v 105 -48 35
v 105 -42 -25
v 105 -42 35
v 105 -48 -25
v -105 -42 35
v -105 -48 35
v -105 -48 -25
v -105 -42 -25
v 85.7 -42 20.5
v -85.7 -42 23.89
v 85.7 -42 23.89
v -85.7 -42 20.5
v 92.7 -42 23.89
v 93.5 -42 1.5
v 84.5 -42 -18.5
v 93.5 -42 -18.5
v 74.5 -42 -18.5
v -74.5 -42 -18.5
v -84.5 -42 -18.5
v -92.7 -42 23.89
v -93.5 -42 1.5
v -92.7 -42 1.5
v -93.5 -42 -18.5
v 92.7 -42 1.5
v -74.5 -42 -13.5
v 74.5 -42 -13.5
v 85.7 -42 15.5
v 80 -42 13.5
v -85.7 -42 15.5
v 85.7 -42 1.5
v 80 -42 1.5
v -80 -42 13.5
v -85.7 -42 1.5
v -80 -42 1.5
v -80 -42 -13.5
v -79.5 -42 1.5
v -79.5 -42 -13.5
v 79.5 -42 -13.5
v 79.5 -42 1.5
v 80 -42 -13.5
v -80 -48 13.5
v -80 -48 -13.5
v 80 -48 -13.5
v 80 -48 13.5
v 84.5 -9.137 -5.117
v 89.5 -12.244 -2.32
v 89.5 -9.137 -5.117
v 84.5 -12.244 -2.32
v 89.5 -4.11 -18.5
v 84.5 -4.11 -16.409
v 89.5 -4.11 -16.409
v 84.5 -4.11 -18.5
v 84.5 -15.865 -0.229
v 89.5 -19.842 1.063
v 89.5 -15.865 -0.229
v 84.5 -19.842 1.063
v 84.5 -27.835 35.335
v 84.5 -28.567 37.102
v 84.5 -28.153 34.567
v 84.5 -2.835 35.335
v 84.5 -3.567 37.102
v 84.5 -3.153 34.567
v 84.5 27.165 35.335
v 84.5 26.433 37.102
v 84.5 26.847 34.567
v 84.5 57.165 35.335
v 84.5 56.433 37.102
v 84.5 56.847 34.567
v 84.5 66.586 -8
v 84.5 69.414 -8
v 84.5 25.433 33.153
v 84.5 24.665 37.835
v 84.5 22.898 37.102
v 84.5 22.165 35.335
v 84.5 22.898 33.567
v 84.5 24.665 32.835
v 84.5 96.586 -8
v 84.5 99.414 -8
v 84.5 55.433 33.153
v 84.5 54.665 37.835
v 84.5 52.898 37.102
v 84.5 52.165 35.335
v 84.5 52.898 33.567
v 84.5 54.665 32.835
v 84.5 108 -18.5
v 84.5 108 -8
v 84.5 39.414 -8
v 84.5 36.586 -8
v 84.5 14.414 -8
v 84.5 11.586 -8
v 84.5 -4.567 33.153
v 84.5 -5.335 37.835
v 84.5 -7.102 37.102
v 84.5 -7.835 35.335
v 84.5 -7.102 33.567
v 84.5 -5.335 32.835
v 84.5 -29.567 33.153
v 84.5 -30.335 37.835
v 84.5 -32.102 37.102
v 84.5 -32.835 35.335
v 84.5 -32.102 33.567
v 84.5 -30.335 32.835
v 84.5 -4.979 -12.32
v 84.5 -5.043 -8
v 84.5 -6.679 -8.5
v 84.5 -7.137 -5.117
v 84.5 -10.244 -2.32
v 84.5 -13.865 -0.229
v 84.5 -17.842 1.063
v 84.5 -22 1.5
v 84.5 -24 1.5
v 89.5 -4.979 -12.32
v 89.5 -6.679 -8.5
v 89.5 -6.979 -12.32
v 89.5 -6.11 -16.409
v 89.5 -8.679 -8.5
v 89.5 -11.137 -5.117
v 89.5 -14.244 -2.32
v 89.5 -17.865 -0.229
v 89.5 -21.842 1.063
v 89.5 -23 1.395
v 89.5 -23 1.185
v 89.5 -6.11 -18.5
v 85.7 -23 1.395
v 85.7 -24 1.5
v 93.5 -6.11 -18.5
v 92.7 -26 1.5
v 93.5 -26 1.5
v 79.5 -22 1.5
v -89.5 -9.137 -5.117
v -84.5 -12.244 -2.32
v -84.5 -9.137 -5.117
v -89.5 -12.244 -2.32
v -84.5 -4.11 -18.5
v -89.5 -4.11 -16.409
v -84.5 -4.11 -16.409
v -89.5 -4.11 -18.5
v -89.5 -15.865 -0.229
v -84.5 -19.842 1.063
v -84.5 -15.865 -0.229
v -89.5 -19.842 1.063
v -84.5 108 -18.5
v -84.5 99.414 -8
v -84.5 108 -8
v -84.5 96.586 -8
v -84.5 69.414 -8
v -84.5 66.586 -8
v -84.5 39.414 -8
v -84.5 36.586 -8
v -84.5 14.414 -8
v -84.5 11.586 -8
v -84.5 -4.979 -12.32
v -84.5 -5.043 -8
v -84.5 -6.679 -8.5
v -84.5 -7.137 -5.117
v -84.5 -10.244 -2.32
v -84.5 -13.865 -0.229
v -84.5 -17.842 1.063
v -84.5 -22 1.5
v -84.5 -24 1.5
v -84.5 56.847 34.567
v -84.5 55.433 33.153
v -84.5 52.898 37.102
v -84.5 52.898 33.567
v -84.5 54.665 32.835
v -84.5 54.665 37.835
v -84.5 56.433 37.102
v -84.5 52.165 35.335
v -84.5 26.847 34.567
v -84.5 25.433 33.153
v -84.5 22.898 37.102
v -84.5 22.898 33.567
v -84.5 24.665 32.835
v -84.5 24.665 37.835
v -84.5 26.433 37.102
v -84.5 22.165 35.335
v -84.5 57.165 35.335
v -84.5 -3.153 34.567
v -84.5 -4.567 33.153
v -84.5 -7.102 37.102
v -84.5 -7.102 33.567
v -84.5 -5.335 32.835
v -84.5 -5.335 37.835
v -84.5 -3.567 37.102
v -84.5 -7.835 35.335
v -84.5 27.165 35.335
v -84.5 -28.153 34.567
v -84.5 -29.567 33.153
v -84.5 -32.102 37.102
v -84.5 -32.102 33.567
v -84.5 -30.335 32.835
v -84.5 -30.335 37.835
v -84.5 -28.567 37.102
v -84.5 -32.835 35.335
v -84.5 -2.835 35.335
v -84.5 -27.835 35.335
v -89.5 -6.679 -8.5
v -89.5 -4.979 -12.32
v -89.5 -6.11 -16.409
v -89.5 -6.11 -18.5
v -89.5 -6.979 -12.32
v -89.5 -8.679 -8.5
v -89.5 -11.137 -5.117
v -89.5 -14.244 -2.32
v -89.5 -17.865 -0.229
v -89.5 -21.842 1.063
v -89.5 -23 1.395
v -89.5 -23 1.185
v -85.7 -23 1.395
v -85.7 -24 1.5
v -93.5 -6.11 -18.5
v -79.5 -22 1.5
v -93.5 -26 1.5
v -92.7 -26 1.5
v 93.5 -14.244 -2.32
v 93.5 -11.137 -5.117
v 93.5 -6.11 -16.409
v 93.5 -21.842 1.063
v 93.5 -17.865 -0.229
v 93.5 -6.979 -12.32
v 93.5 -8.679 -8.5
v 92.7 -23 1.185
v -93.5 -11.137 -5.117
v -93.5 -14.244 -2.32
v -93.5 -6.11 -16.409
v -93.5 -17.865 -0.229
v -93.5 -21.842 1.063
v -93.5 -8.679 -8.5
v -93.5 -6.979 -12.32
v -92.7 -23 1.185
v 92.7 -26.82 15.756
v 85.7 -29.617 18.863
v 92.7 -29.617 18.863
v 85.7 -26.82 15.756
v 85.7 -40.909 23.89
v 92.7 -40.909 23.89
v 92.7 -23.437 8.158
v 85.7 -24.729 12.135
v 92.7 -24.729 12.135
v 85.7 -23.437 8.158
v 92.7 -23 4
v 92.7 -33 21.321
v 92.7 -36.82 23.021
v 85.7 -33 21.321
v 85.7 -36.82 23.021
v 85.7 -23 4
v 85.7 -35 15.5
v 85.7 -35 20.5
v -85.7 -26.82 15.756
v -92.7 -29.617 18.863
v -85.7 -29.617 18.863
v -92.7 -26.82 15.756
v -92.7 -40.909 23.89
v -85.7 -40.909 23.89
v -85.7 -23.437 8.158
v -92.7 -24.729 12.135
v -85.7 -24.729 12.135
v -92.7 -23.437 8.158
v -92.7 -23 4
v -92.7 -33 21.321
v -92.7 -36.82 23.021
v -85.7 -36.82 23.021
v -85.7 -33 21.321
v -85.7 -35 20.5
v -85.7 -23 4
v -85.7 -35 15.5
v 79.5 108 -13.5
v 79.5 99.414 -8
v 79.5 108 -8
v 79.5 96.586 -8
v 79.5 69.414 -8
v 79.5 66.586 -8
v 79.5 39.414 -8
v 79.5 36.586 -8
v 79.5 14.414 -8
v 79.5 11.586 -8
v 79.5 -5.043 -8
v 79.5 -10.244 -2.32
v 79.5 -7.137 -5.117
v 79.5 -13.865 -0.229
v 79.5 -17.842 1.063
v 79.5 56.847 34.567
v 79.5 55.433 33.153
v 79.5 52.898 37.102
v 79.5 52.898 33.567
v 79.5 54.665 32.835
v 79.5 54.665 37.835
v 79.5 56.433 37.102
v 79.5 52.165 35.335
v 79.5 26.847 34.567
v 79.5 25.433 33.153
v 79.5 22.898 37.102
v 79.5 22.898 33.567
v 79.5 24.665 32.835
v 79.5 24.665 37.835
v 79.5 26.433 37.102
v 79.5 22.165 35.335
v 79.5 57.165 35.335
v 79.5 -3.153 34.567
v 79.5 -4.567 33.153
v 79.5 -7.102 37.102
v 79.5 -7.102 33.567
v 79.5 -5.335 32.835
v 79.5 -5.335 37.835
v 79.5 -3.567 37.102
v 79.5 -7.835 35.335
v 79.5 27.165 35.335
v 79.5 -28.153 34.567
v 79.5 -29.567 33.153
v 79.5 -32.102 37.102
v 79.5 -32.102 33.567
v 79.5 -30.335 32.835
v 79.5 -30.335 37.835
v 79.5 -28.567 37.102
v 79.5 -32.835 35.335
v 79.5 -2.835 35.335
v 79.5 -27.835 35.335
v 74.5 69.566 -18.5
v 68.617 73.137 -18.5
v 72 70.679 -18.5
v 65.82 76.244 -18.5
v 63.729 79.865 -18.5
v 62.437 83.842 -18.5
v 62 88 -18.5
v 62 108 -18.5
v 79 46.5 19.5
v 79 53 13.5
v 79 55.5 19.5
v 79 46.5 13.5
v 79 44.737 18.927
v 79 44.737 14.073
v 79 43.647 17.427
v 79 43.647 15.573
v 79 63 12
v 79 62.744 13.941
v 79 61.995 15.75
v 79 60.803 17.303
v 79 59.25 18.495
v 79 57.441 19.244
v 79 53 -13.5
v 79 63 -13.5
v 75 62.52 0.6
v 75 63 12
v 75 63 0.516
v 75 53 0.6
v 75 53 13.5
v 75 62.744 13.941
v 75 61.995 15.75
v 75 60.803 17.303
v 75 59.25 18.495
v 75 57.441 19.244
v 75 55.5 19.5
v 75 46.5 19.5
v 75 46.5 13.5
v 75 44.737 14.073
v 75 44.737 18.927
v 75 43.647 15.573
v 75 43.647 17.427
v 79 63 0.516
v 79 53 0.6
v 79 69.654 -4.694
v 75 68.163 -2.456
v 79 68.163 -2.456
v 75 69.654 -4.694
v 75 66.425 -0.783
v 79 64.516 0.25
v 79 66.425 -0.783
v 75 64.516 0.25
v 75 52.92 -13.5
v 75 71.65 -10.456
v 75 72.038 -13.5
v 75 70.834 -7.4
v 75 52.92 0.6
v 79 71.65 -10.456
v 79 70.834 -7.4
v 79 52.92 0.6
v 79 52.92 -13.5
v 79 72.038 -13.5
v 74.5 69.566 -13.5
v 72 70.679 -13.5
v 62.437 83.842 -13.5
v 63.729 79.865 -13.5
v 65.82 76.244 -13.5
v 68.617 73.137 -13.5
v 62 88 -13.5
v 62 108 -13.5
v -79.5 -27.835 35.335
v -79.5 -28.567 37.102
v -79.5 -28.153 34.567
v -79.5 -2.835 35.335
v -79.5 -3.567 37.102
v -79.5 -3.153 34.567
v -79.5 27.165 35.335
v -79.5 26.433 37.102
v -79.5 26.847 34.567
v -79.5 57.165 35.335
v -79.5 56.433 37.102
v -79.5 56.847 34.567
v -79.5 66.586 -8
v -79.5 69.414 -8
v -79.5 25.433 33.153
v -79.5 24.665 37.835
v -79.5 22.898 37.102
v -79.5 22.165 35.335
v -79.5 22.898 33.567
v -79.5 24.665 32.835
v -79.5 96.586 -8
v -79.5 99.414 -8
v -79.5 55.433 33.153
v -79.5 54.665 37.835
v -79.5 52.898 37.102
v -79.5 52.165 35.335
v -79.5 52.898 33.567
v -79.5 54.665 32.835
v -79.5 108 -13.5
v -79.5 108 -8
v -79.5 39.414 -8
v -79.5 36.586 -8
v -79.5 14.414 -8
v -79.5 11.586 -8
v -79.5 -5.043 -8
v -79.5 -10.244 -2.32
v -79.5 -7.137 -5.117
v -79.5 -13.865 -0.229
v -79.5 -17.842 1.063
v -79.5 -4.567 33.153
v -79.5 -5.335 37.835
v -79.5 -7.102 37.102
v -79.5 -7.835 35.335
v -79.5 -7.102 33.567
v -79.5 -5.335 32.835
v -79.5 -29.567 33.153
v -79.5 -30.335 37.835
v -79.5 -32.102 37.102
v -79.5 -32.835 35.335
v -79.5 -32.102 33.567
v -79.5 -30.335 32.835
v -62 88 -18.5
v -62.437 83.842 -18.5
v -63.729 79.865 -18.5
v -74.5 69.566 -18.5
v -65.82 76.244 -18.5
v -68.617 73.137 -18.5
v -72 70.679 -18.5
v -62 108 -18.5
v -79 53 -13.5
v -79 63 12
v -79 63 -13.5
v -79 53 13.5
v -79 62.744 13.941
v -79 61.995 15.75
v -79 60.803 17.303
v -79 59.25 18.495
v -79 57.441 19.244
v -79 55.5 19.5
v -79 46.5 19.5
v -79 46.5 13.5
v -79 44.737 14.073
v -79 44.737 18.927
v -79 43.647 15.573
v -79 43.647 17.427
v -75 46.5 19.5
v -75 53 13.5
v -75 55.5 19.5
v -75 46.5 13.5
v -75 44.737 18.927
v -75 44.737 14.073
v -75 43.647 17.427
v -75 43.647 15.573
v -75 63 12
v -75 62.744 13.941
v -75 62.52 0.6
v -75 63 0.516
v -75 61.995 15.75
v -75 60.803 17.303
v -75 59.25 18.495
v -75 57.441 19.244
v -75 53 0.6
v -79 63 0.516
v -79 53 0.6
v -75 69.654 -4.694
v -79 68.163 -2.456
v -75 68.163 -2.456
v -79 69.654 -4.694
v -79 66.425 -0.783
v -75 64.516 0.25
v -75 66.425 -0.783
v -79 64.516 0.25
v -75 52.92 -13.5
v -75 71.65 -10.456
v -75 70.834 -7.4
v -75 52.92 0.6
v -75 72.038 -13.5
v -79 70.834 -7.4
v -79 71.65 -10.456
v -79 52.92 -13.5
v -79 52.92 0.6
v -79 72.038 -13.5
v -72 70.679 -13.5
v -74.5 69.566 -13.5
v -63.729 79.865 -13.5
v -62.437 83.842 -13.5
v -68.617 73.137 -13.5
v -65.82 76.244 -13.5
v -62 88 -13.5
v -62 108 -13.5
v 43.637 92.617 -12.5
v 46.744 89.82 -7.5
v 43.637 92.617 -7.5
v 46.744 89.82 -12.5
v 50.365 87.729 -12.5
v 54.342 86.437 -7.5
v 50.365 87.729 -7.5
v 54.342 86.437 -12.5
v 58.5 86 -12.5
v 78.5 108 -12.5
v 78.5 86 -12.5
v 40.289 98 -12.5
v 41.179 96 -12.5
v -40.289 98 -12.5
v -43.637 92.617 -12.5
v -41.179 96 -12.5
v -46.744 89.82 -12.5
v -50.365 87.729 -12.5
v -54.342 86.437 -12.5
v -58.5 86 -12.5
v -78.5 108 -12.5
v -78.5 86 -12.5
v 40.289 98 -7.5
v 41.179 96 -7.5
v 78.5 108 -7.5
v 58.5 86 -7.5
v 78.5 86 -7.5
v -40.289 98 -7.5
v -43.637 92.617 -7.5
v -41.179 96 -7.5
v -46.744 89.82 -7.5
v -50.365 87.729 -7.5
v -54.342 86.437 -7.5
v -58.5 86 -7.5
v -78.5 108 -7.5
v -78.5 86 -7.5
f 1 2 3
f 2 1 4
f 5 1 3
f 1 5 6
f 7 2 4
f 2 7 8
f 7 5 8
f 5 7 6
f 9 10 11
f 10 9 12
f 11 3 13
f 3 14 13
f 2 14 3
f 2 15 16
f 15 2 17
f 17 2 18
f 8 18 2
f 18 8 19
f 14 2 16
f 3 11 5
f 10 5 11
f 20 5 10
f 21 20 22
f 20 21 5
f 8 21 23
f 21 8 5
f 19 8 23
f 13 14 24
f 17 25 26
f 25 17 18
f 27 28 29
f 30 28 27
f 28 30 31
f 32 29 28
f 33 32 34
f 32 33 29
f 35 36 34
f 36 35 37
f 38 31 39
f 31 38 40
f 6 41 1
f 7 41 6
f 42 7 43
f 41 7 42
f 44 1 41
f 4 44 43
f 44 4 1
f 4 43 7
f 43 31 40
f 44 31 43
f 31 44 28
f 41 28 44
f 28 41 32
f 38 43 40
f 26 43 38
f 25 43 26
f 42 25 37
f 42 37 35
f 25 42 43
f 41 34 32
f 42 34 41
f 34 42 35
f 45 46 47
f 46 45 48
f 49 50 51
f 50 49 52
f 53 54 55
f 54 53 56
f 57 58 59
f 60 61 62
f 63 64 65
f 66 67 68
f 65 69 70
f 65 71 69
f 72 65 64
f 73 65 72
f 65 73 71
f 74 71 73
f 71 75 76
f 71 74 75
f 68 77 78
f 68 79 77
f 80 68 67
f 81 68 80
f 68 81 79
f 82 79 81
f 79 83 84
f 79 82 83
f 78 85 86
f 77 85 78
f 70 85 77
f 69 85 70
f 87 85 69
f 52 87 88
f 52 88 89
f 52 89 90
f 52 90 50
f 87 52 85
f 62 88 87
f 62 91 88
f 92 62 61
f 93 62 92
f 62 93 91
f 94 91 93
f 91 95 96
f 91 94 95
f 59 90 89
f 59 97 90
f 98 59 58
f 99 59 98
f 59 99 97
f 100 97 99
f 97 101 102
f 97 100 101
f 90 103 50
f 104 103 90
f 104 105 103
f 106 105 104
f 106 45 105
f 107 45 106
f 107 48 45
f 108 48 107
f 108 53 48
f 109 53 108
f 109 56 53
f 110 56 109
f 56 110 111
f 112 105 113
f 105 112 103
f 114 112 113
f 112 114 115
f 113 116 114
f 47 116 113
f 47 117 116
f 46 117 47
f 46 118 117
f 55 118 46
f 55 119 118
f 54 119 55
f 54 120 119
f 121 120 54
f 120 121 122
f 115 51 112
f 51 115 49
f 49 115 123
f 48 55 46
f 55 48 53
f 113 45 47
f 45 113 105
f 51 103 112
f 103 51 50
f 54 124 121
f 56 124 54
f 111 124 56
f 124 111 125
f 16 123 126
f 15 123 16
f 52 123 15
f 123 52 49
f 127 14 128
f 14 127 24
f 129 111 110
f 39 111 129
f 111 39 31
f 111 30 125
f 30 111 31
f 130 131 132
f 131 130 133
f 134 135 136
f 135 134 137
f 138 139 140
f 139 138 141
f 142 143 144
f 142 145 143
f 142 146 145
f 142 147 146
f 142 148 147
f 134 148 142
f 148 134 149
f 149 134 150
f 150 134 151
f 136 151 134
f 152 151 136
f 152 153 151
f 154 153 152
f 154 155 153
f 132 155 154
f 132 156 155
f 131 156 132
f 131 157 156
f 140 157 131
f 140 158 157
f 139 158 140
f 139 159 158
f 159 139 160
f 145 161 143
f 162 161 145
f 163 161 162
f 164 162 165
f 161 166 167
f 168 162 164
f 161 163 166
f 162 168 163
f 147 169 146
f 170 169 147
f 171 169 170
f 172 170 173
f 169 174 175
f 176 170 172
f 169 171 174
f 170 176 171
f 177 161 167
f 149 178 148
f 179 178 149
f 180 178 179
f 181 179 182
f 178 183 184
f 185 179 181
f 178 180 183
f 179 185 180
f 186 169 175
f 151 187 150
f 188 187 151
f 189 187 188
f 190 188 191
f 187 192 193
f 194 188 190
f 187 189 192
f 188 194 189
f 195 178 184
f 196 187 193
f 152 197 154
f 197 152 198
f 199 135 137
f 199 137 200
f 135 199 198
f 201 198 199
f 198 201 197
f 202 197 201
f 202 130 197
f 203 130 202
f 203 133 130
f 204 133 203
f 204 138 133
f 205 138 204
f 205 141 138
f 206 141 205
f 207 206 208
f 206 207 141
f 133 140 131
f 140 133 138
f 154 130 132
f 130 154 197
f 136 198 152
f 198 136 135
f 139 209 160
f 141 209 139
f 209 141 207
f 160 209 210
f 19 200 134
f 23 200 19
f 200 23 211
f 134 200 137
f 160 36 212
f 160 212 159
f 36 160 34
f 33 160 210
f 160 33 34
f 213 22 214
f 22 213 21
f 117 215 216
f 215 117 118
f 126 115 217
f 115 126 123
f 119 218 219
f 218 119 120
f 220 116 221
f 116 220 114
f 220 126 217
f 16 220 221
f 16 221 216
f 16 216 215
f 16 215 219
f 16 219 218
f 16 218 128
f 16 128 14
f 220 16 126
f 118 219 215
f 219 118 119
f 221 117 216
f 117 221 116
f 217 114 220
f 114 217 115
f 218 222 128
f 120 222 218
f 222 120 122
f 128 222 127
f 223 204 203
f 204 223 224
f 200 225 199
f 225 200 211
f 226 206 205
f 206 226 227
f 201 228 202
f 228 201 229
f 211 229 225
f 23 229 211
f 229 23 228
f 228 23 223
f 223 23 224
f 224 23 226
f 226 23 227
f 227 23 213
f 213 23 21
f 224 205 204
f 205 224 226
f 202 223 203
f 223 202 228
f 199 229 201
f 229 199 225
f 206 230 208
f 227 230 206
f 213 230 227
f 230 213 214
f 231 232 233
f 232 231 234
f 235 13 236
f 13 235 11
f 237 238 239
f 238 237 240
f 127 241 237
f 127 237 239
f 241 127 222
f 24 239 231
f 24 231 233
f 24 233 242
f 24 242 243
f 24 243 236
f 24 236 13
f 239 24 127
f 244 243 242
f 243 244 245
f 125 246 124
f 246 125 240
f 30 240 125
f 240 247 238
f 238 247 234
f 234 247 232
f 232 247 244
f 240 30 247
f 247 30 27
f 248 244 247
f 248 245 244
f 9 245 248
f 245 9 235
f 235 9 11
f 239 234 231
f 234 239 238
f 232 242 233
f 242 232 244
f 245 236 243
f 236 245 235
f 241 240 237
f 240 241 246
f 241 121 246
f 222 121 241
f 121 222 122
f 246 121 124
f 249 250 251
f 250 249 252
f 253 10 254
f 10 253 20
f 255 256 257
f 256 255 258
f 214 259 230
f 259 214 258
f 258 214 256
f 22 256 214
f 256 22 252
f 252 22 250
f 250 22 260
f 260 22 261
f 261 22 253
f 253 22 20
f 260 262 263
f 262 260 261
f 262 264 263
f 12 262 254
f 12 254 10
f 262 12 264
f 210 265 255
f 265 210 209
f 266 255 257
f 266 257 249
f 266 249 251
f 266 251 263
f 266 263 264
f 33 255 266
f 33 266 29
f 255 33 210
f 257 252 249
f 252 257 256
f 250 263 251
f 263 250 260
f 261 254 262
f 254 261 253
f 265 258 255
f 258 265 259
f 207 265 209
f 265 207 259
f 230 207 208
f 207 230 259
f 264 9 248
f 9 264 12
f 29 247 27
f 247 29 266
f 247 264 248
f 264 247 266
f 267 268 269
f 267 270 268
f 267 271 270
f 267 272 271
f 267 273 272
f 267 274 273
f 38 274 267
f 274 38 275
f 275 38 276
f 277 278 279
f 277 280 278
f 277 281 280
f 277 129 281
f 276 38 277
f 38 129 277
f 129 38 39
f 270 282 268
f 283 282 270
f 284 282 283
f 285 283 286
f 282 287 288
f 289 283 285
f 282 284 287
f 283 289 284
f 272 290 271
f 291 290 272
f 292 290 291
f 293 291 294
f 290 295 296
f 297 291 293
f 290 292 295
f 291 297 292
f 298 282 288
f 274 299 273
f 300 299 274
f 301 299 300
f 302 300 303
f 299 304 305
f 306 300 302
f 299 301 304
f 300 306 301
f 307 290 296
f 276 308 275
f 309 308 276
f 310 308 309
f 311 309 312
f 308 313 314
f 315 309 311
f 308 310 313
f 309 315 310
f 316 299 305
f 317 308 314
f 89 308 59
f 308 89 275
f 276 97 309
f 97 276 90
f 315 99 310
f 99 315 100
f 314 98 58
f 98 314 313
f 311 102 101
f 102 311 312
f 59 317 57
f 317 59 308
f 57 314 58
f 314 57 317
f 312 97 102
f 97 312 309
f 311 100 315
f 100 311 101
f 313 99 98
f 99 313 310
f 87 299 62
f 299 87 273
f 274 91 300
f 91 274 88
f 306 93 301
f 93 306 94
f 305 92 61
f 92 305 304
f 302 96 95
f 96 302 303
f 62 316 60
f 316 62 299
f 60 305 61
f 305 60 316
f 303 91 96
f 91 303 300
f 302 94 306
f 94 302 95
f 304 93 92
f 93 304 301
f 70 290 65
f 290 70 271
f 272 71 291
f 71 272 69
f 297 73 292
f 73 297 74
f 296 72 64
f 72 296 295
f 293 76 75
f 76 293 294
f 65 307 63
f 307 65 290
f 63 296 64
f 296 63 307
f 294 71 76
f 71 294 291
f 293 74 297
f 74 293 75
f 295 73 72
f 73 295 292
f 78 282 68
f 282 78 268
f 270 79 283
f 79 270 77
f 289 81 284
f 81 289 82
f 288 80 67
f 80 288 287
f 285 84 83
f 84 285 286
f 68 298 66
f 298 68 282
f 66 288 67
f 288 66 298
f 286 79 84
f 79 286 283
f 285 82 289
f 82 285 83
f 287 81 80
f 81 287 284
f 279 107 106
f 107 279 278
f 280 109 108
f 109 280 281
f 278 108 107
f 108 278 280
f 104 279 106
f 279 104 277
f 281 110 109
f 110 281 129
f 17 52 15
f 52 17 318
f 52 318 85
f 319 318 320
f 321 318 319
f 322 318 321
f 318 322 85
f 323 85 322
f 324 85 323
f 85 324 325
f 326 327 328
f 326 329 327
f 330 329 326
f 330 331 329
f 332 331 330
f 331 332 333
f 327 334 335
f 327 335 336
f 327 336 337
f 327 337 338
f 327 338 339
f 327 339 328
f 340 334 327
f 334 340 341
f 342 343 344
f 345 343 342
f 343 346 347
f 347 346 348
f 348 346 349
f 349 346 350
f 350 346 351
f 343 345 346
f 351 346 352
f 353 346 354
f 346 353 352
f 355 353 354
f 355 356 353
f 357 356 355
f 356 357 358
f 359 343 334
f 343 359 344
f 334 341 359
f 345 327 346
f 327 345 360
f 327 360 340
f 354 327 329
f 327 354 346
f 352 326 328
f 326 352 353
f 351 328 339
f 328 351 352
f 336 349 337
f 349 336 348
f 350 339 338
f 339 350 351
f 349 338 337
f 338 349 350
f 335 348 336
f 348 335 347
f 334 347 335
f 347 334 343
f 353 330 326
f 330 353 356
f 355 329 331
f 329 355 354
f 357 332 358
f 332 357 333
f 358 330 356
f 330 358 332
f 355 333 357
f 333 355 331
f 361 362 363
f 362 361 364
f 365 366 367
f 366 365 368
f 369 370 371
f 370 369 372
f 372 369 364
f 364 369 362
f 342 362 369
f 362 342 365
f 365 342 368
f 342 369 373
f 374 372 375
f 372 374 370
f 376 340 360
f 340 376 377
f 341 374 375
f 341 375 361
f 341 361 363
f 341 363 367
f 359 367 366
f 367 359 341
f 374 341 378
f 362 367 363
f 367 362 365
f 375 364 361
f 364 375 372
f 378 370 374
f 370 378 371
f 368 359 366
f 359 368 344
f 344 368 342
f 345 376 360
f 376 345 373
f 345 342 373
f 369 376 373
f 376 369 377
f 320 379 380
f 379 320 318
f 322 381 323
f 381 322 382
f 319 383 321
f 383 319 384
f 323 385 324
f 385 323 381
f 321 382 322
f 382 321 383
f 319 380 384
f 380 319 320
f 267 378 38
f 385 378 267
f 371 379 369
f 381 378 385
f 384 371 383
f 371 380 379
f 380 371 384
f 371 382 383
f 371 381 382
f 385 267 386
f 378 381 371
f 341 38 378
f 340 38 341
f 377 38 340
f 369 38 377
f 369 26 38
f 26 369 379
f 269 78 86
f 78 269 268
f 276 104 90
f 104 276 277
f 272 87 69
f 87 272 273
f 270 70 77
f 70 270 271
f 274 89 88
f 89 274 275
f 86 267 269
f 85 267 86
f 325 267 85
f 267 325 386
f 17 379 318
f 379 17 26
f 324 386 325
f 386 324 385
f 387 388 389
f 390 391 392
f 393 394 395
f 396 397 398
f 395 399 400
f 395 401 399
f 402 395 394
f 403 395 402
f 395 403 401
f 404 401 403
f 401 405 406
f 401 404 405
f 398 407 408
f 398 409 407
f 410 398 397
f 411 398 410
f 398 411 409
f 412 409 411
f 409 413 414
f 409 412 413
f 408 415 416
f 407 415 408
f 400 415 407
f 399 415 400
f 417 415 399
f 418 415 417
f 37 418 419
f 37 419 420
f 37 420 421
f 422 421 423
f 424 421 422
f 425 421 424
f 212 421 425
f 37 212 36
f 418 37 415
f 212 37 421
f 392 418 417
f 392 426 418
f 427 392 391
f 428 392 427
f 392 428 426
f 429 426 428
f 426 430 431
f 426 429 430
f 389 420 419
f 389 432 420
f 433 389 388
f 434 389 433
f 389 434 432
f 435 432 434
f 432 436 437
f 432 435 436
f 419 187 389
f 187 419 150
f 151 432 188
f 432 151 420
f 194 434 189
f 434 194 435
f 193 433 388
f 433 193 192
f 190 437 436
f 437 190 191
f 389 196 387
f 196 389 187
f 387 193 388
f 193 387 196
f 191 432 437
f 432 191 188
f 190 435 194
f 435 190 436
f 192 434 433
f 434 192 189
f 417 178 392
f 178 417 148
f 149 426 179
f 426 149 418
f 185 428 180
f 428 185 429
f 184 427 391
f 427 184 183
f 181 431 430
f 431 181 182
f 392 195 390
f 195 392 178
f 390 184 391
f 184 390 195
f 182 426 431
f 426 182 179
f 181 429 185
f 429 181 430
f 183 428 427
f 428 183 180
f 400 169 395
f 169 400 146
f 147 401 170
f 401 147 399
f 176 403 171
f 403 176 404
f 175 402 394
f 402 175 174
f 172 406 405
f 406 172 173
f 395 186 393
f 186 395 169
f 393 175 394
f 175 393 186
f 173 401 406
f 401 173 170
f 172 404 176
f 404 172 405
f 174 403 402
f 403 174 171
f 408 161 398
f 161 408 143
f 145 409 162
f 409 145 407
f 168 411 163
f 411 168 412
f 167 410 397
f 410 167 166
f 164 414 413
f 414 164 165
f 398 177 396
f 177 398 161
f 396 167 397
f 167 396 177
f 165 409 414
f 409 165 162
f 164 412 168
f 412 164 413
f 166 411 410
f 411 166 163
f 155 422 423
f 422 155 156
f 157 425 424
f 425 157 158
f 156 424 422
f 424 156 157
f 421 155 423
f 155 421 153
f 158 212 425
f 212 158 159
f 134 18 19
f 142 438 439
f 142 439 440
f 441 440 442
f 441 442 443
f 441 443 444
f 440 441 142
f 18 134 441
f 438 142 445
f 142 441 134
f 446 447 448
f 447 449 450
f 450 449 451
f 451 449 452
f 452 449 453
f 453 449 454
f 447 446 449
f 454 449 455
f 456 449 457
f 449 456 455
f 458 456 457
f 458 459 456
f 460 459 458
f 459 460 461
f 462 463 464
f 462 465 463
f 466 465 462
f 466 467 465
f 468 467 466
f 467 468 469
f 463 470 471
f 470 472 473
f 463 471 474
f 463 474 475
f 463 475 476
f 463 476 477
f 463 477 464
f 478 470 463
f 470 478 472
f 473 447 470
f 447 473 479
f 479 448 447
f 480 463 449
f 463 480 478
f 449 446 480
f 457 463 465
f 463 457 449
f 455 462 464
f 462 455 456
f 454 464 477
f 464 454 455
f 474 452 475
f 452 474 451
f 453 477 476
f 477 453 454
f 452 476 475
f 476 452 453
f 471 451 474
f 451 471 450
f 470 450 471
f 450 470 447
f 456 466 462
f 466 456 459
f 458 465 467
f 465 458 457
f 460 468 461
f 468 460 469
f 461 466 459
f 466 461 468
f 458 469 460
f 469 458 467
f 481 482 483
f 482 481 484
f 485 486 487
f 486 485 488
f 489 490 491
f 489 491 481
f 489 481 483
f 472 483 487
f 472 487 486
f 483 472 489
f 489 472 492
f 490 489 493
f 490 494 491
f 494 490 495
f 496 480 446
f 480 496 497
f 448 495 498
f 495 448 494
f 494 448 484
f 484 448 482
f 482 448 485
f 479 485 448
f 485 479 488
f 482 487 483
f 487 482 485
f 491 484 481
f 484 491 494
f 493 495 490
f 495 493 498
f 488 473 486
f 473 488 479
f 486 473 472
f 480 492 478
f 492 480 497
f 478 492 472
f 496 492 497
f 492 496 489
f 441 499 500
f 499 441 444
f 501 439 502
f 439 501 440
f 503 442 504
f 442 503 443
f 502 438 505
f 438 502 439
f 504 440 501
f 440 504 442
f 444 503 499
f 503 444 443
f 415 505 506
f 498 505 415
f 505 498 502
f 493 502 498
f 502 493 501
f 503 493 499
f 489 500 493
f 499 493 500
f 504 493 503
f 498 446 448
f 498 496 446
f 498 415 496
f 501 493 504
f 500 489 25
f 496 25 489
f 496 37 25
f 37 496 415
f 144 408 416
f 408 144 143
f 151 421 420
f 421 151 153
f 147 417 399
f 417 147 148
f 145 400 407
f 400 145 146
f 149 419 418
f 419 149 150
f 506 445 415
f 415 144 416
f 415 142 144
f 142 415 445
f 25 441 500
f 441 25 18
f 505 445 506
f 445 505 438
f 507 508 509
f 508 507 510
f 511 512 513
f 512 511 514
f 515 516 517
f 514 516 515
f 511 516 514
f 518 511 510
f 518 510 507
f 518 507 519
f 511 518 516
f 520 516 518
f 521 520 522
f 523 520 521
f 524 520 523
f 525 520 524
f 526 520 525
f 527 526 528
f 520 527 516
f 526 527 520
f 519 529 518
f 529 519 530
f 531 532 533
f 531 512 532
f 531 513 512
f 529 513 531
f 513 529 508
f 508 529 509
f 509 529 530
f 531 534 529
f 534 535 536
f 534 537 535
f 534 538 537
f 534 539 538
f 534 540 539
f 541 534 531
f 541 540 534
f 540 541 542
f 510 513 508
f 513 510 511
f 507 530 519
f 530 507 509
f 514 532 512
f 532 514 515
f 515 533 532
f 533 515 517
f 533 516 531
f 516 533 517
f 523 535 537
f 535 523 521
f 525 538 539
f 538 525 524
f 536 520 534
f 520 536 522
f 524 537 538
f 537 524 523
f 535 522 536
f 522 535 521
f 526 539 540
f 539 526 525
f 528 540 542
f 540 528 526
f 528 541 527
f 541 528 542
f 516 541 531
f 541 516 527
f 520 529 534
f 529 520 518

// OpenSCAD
//ForPrint();
ForDisplay();

module ForDisplay(){
	rotate([0,0,0]) FrontPlate();
	translate([82,33,-13]) Rail();
	mirror([180,0,0]) translate([82,33,-13]) Rail();
	translate([0,103,-10])  BackRail();
}

module ForPrint(){
	translate([0,-70,0]) FrontPlate();
	translate([82,33,-13]) Rail();
	mirror([180,0,0]) translate([82,33,-13]) Rail();
	translate([0,40,0]) translate([0,103,-10])  BackRail();	
}

module FrontPlate(){
	difference(){
		translate([0,-45,5]) cube([210,6,60],center=true); //Front plate
#		cube([160,103,27],center=true); // switch size
	}

	translate([90,-24,-15.5]) GlueSpot();
	mirror([180,0,0]) translate([90,-24,-15.5]) GlueSpot();
	translate([94,-26,-15.5]) GlueSpot();
	mirror([180,0,0]) translate([94,-26,-15.5]) GlueSpot();

	translate([85,-40,4]) scale([1.4,1,1]) rotate([270,180,0]) GlueSpot();
	mirror([180,0,0]) translate([85,-40,4]) scale([1.4,1,1]) rotate([270,180,0]) GlueSpot();
	
	translate([0,-40,18]) cube([180,10,5],center=true);
}

module BackRail(){

	cube([157,10,5], center=true);
	rotate([0,-90,90]) translate([3,-58.5,0]) GlueSpot();
	mirror([180,0,0]) rotate([0,-90,90]) translate([3,-58.5,0]) GlueSpot();

}

module Rail(){
//	#translate([0,0,-5]) cube([55,55,55]);
	cube([5,150,10],center=true); //Virtical
	translate([-2.5,0,-3]) cube([10,150,5],center=true); //Horizontal
	
	translate([0,-40,25]) rotate([45,0,0]) CompressFit();
	translate([0,-15,25]) rotate([45,0,0]) CompressFit();
	translate([0,15,25]) rotate([45,0,0]) CompressFit();
	translate([0,45,25]) rotate([45,0,0]) CompressFit();
	
	translate([3,-55,-2.5]) GlueSpot();
	
//Stop Block
 
	difference(){
		union(){
			translate([-5,25,10]) cube([4,10,30],center=true); //Virtical
			rotate([90,0,0]) translate([-5,29.5,-18]) cube([4,6,9],center=true);  // Horizontal 
			translate([-5,22.5,25]) rotate([0,90,0]) cylinder(h=4,d=15,center=true); //Outside
			translate([-5,13.5,29.5]) rotate([0,90,0]) cylinder(h=4,d=6,center=true); //End
		}
	translate([-5,10,12]) cube([6,20,29],center=true); // Cut Out
	}
	scale([.8,.48,.80]) translate([-3.25,61.5,0])  GlueSpot();

	//
	
	translate([-10,65,-3]) cube([20,20,5],center=true); //Back Block
	
	difference(){
		translate([0,55,-3]) cylinder(h=5,r=20,center=true);
		translate([10,55,-3]) cube([20,40,7],center=true);
	}
}

module  CompressFit(){
	cube([5,2,70],center=true);
	translate([0,0,33]) rotate([0,90,0]) cylinder(h=5,d=5,center=true);
}

module GlueSpot(){
rotate([0,90,0])	
	translate([3,0,0])
		 difference(){
			union(){
				translate([0,0,-3]) cylinder(h=5,r=20,center=true);
				translate([-10,-10,-3]) cube([20,20,5],center=true);
			}
			translate([10,0,-3]) cube([20,40,7],center=true);
		}
}
